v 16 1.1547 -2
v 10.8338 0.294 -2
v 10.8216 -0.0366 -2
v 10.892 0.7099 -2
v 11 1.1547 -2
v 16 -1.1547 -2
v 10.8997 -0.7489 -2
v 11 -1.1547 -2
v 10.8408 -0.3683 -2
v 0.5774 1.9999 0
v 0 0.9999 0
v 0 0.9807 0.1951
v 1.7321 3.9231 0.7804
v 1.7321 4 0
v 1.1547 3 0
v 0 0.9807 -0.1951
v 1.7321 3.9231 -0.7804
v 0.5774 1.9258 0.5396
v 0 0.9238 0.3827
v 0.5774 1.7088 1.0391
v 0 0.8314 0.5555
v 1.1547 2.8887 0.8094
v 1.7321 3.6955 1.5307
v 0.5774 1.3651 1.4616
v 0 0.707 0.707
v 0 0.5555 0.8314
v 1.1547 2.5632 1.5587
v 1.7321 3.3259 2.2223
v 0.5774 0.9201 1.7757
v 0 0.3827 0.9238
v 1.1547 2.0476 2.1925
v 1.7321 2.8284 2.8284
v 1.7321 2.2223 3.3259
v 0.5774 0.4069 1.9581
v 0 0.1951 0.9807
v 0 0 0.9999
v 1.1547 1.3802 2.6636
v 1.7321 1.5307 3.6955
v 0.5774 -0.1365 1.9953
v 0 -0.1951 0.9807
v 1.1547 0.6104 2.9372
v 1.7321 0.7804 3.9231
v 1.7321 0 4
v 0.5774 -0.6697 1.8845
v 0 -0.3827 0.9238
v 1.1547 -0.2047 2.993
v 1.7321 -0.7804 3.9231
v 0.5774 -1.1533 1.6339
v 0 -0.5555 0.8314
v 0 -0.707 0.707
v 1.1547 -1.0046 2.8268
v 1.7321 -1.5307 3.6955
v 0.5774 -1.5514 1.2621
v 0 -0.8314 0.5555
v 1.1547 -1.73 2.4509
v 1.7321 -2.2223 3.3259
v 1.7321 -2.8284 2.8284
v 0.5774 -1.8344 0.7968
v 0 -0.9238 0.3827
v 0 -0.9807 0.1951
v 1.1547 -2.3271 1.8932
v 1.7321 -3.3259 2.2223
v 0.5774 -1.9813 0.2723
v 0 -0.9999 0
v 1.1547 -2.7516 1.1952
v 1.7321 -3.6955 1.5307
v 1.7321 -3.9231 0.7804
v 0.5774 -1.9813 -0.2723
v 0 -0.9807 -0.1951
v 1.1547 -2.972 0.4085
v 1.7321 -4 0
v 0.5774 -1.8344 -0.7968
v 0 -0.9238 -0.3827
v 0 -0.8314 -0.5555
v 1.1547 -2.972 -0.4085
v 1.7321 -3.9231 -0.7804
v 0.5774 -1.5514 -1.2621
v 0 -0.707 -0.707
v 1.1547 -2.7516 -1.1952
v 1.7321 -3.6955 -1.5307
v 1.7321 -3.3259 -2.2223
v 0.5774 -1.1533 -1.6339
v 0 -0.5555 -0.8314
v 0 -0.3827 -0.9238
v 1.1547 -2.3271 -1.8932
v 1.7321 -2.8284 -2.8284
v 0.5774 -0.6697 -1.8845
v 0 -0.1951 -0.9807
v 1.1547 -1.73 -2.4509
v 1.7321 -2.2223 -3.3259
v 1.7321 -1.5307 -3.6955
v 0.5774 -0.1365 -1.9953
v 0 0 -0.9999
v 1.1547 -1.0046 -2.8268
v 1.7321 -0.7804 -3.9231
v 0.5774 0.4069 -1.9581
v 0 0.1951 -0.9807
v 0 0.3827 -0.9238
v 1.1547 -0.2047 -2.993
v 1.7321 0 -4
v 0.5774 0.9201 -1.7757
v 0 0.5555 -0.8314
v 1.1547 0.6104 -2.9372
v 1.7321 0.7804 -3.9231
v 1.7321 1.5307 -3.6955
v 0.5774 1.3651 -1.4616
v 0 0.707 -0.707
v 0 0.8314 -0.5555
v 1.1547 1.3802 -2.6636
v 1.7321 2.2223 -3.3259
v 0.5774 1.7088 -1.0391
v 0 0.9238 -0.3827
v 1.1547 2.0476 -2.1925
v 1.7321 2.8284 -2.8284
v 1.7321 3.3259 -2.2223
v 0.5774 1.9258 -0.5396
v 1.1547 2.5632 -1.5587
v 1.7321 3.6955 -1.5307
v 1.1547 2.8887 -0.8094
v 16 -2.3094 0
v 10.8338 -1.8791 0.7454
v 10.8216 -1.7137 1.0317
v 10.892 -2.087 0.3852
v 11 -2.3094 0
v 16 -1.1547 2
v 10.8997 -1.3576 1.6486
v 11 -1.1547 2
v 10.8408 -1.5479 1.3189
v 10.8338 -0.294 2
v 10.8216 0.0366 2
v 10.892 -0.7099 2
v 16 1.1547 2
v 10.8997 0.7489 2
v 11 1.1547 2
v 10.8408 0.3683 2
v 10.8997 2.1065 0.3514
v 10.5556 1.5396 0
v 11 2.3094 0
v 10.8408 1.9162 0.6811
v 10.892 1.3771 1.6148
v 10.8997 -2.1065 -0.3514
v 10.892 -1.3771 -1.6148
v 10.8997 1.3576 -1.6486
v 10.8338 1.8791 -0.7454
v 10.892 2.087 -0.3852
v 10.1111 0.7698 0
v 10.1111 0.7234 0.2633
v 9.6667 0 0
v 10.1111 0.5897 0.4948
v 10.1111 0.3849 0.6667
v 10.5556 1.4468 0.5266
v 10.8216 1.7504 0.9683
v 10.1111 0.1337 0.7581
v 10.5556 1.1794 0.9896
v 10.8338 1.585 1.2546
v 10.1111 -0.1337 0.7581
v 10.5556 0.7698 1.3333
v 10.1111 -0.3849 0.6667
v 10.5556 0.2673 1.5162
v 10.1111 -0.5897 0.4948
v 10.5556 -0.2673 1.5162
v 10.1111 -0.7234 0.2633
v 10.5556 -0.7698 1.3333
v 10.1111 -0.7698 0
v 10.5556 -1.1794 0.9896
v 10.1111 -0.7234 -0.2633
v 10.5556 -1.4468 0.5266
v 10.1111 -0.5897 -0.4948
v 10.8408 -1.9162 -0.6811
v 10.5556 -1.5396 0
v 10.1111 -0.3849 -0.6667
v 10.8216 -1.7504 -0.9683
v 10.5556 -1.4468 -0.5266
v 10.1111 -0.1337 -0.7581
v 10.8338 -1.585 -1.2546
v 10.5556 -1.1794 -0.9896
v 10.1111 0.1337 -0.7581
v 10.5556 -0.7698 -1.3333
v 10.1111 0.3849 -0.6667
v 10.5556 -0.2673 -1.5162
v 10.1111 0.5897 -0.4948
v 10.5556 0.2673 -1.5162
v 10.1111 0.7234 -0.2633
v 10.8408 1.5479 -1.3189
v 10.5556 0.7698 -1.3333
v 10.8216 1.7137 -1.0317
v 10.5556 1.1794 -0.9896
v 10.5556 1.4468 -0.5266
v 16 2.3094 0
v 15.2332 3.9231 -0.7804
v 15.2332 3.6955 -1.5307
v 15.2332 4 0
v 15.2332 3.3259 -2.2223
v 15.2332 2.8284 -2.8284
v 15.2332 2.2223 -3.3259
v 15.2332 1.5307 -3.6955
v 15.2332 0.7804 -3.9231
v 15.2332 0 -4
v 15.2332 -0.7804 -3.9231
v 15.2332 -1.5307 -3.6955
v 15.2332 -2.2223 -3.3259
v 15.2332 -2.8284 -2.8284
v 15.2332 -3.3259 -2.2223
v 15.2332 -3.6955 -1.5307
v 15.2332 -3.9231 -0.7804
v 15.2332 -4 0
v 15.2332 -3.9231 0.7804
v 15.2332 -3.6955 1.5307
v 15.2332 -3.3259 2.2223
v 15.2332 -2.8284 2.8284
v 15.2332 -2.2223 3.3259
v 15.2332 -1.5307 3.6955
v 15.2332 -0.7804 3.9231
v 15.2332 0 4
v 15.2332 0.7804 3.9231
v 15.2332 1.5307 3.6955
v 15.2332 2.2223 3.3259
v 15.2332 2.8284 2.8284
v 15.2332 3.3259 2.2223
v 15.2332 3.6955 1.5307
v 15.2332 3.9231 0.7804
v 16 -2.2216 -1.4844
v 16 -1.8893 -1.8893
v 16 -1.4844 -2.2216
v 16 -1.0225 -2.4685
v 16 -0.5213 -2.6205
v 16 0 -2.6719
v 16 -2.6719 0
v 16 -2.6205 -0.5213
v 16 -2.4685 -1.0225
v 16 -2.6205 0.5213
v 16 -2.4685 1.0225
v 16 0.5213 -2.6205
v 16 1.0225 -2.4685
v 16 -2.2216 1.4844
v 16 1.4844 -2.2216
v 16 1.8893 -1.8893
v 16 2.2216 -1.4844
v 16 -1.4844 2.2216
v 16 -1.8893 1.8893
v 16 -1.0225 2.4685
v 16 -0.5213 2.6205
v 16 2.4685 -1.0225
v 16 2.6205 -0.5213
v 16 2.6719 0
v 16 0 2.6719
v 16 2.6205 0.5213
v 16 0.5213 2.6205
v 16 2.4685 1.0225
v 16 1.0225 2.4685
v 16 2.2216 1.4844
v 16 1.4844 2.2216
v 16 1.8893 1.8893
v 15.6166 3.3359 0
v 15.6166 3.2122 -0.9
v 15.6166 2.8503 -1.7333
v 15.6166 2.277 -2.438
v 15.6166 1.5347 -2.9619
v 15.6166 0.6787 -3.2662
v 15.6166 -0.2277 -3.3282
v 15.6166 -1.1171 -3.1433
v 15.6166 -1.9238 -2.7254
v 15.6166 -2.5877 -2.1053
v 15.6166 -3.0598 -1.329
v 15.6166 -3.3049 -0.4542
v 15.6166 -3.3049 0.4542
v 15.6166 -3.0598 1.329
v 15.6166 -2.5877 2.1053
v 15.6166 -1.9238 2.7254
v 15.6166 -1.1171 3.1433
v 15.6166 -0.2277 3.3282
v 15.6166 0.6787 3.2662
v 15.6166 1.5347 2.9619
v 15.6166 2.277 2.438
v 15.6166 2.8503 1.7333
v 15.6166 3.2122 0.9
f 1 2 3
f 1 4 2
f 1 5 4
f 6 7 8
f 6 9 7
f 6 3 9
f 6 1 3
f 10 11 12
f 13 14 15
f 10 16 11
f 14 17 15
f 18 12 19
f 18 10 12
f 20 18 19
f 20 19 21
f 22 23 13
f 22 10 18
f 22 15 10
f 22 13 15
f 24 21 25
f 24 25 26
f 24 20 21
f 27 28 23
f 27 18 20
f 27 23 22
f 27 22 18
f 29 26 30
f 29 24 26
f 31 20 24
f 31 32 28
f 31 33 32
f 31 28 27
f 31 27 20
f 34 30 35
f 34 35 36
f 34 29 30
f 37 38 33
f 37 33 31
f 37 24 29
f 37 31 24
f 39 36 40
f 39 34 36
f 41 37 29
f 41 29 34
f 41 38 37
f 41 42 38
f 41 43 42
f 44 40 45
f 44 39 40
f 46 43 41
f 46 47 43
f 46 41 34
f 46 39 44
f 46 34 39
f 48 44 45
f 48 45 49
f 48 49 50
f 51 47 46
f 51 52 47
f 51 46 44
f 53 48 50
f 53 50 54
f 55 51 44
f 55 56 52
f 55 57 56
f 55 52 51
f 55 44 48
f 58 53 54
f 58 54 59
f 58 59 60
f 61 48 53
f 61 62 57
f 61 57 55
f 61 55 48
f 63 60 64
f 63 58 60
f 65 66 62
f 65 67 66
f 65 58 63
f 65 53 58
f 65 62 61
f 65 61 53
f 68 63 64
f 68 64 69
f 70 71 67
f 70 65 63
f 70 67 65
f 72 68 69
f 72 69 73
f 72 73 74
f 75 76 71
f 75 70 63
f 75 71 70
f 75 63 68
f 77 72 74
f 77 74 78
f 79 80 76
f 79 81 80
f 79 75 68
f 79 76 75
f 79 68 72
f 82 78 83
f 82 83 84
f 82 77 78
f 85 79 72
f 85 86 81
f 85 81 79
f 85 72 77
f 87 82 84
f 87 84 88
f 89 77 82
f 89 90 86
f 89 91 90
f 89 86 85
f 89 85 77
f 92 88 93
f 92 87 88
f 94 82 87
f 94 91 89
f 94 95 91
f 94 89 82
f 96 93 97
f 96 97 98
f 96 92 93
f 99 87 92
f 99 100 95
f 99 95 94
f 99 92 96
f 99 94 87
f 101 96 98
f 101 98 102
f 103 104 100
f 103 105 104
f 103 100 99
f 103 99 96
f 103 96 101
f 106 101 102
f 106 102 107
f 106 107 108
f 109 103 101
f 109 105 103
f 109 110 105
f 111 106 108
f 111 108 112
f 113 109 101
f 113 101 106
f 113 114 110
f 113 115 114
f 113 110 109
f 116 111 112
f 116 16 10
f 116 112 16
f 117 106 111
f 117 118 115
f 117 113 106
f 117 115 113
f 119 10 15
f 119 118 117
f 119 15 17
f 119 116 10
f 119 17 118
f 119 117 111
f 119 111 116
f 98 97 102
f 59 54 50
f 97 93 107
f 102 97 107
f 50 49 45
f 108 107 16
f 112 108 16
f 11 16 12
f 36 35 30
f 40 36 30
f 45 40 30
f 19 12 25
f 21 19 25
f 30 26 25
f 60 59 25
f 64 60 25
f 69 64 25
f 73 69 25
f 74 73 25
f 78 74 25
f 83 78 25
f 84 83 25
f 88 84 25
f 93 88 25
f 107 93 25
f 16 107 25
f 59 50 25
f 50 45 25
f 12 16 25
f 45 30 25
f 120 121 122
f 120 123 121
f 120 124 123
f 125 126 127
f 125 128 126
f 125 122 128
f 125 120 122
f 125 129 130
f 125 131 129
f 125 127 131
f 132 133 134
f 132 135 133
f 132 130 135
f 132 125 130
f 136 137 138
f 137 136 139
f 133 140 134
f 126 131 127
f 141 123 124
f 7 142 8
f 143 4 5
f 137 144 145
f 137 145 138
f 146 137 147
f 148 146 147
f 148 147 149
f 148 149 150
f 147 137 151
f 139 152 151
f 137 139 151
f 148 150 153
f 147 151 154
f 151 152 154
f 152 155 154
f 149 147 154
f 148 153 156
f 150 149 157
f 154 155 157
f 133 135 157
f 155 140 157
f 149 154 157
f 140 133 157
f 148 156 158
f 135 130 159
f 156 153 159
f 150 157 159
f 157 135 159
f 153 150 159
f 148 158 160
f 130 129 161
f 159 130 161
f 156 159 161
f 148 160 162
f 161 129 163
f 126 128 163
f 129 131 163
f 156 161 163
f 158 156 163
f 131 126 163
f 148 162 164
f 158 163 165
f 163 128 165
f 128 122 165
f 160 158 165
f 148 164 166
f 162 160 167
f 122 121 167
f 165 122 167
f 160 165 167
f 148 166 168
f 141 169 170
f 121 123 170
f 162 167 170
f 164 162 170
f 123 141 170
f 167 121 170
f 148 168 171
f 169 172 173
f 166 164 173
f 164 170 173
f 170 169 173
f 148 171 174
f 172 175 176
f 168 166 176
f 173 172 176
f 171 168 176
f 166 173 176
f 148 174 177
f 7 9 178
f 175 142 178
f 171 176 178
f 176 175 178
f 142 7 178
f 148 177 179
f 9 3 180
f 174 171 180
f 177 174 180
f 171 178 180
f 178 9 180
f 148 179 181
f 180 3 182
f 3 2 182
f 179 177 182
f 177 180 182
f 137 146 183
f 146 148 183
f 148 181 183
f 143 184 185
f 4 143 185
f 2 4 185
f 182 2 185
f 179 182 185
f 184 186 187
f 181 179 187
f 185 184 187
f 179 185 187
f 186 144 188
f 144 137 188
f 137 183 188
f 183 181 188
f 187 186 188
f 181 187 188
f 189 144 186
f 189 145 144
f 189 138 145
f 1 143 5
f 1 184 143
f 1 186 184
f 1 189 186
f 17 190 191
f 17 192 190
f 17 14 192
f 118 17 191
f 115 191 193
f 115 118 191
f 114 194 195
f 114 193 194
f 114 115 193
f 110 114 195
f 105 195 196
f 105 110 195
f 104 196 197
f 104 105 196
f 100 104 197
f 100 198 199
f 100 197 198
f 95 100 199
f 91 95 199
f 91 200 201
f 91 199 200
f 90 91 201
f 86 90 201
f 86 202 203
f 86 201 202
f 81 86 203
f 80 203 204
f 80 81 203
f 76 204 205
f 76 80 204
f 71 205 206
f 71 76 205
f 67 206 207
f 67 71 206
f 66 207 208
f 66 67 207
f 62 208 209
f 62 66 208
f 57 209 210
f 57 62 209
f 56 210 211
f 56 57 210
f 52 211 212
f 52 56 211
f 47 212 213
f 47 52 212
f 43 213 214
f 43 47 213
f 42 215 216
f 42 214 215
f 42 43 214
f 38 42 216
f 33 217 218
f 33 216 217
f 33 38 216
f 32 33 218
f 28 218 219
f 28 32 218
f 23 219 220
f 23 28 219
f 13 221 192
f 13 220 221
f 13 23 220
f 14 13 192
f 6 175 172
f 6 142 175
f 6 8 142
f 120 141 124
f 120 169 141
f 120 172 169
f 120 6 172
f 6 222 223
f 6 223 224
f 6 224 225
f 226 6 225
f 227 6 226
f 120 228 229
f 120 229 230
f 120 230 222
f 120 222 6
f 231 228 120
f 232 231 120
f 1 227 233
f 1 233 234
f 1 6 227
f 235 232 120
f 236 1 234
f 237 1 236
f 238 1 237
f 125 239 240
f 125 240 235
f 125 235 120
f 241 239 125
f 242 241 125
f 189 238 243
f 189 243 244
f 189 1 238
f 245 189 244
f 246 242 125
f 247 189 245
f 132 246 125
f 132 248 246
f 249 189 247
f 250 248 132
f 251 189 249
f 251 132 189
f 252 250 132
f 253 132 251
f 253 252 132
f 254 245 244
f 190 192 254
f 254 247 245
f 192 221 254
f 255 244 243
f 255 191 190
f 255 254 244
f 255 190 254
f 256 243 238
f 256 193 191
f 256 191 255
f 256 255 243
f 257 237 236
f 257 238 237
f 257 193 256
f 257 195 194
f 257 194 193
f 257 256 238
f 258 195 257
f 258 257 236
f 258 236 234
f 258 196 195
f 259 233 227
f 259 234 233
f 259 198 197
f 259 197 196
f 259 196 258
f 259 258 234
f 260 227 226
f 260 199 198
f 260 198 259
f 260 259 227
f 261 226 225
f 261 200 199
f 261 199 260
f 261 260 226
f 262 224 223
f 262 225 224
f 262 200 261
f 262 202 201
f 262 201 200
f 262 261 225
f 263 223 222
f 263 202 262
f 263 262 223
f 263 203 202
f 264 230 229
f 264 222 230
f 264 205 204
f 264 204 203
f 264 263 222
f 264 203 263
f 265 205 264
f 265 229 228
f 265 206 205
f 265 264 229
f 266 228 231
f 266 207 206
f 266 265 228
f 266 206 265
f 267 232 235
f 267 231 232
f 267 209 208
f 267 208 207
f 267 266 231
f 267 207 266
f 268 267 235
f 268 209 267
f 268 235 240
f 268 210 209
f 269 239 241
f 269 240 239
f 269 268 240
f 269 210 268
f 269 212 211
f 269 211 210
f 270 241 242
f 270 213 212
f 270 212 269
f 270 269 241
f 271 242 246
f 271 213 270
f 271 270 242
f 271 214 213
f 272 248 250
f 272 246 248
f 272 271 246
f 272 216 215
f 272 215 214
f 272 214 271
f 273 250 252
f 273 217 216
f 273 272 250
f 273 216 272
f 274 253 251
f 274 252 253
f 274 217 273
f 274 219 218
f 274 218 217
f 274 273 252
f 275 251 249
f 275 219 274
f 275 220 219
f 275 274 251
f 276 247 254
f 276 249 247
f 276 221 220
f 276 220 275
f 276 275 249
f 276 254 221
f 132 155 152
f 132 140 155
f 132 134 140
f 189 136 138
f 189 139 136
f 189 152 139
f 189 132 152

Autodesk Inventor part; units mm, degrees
ref_plane "YZ Plane" through (0, 0, 0) normal (1, 0, 0) x (0, 1, 0)
ref_plane "XZ Plane" through (0, 0, 0) normal (0, 1, 0) x (-1, 0, 0)
sketch "Эскиз1" plane through (0, 0, 0) normal (0, 0, 1) x (1, 0, 0)
  line L0 (0, 0) -> (9.6667, 0)
  line L1 (16, 2.3094) -> (16, 4)
  line L2 (16, 4) -> (0, 4)
  line L3 (16, 2.3094) -> (11, 2.3094)
  line L4 (11, 2.3094) -> (9.6667, 0)
  line L5 (0, -0.8) -> (0, 4.8) projected
  line L6 (0, 4) -> (0, 0)
  dimension "d0" = 5
  dimension "d1" = 60
  dimension "d2" = 8
  dimension "d3" = 4.6188
  dimension "d5" = 16
revolve "Базовый элемент" add sketch "Эскиз1" angle 360 about axis through (0, 0, 0) along (1, 0, 0)
sketch "Эскиз2" plane through (16, 0, 0) normal (1, 0, 0) x (0, 1, 0)
  circle A0 centre (0, 0) radius 2.3094 projected
  line L0 (-1.1547, 2) -> (1.1547, 2)
  line L1 (1.1547, 2) -> (2.3094, 0)
  line L2 (2.3094, 0) -> (1.1547, -2)
  line L3 (1.1547, -2) -> (-1.1547, -2)
  line L4 (-1.1547, -2) -> (-2.3094, 0)
  line L5 (-2.3094, 0) -> (-1.1547, 2)
  point P0 (0, 0)
  point P1 (0, 0)
extrude "Паз" add sketch "Эскиз2" against normal up to next contours L1 A0 | A0 L2 | L0 A0 | A0 L3 | L5 A0 | A0 L4
thread "Резьба" size "M8x1.25" class "6g" standard "ISO Metric profile" length 16
chamfer "Фаска1" distance 1.7321 angle 60 1 edges at (0, -4, 0) measured on face at (10.6667, 3.987, -0.3219)
chamfer "Фаска2" distance 0.7668 angle 60 1 edges at (16, -4, 0) measured on face at (11.244, 3.9482, -0.6416)
ref_plane "Work Plane1" through (8, 0, 0) normal (0, 0, 1) x (1, 0, 0)
equation "\"d0\" = INTI"
equation "\"d2\" = NND"
equation "\"d3\" = 1.1547 * SW"
equation "\"d5\" = NLG"
equation "\"d12\" = NLG"
equation "\"d9\" = FAWI"
equation "\"d10\" = -0.5 * GD1 + 0.5 * NND"
equation "\"d11\" = FAWI"
equation "\"d35\" = -0.5 * GD1 + 0.5 * NND"
equation "\"NND\" = 8"
equation "\"NLG\" = 16"
equation "\"INTI\" = 5"
equation "\"FAWI\" = 60deg"
equation "\"SW\" = 4"
equation "\"GD1\" = THREADDIA - 1.2269 * PTC"
equation "\"FAWI1\" = 45deg"
equation "\"SPD\" = 2"
equation "\"GUL\" = 0.61345 * PTC"
equation "\"TOA\" = 30deg"
equation "\"THREADDIA\" = 8"
equation "\"PTC\" = 1.25"
equation "\"GAL\" = 0.61345 * PTC"
equation "\"E0\" = 1.155 * SW"
properties part number "AS 1421 - M8x16 конический" material "Сталь, мягкая"
